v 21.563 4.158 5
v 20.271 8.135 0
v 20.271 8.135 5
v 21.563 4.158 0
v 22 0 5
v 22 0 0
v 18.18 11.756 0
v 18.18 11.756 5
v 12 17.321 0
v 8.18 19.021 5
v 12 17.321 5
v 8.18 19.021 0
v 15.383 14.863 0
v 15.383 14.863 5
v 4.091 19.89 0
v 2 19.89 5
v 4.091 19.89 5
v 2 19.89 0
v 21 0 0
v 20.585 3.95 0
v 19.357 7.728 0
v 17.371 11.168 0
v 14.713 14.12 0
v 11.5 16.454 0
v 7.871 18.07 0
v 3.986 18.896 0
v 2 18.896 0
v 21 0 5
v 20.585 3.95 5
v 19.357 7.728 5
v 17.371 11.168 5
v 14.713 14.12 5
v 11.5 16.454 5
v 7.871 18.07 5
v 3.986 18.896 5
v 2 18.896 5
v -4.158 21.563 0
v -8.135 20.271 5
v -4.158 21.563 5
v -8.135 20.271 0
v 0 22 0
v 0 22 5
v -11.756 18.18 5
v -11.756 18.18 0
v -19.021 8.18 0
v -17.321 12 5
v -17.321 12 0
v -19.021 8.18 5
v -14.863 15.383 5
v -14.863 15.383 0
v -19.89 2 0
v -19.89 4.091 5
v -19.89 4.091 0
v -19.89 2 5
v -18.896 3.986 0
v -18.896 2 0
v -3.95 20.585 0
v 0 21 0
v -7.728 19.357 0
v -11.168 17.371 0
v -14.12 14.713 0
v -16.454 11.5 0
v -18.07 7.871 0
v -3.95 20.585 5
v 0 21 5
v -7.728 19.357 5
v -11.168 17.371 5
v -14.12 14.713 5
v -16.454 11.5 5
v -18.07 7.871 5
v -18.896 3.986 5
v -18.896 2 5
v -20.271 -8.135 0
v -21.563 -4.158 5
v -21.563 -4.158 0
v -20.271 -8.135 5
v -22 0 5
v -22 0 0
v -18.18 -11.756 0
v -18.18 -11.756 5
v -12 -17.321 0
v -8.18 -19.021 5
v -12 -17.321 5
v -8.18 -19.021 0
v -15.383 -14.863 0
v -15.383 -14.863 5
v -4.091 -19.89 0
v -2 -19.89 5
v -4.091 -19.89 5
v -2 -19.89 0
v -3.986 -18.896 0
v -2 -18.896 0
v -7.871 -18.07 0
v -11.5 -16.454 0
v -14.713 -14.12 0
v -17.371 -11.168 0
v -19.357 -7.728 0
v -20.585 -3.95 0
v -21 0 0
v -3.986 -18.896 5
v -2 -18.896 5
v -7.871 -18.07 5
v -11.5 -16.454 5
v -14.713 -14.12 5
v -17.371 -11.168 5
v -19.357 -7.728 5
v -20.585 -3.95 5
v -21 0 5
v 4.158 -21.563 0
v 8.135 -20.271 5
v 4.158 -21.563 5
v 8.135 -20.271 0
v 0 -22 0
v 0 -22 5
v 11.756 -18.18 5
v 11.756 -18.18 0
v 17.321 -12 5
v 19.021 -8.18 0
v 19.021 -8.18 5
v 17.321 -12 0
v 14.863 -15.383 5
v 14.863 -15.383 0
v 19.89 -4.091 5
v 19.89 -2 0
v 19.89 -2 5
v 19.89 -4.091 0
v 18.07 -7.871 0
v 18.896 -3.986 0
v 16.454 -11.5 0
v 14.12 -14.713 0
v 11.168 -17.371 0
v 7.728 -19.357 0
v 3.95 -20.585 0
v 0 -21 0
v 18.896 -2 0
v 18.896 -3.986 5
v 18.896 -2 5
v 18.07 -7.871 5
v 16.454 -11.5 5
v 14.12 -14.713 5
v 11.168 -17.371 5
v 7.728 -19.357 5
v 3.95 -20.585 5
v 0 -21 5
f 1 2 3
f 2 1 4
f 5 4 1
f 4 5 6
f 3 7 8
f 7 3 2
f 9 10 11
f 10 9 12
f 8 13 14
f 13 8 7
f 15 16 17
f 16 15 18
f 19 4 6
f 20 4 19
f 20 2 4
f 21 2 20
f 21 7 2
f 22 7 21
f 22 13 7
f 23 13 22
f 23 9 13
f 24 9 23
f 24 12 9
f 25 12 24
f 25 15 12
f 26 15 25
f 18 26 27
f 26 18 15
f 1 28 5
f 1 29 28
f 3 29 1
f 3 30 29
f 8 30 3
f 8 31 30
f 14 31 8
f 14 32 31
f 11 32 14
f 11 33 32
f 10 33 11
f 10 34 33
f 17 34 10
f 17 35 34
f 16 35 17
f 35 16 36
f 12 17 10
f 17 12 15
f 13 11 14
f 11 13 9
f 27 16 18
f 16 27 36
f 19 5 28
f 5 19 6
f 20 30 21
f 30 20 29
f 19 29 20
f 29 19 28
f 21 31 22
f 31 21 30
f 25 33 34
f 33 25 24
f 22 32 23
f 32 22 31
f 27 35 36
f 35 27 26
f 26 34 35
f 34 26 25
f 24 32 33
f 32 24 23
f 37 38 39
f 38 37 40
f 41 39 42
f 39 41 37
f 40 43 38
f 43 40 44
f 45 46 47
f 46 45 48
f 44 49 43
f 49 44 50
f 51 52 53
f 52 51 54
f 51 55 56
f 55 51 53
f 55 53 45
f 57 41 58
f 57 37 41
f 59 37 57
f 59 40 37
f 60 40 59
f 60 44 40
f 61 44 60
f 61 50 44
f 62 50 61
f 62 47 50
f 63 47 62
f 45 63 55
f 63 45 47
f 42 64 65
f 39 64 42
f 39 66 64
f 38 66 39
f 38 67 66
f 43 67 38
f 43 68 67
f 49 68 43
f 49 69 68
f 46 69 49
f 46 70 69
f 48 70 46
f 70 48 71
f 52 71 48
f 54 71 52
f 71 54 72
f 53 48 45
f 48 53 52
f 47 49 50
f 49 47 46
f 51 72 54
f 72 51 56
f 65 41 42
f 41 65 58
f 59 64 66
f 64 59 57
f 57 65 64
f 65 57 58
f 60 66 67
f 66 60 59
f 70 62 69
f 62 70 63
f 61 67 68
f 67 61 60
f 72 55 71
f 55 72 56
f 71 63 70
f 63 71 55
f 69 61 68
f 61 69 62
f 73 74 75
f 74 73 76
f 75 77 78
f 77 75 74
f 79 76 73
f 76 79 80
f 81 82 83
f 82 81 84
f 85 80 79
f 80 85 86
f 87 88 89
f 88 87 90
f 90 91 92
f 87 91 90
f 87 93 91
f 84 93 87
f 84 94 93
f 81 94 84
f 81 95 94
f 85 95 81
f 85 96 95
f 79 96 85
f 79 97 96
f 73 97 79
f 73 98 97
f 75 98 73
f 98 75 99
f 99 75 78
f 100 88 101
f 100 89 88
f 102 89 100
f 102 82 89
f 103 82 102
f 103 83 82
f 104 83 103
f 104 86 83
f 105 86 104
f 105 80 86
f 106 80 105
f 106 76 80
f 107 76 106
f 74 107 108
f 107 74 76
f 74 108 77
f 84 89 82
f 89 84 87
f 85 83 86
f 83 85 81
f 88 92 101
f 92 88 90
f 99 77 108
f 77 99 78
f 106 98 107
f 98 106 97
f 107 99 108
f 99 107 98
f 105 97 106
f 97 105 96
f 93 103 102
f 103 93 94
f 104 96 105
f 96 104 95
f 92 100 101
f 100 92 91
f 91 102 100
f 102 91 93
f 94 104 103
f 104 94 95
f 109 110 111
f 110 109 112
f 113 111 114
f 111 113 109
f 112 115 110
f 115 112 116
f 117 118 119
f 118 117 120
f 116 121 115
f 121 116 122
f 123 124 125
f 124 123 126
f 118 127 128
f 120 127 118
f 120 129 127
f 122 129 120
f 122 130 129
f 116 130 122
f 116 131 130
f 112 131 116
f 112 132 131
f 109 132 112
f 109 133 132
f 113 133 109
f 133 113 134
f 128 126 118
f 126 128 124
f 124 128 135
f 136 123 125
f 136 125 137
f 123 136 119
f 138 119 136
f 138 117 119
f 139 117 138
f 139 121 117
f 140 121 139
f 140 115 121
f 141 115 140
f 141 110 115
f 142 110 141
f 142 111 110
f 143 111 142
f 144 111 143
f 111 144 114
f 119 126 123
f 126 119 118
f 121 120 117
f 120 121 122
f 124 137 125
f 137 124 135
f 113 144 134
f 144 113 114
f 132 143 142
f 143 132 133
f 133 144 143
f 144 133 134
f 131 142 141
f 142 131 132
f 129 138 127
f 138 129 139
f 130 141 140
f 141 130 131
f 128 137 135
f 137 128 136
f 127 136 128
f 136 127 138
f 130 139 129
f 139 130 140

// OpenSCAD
module segment (r)
{
    intersection ()
    {
        cylinder (r=r,h=5);
        cube ([r,r,6]);
    }
}

module arc(r)
{
    difference ()
    {
        segment (r);
        segment (r-1);
    }
}

module space (r)
{
    translate ([$t*10+2,0,0]) arc (r);
    translate ([0,$t*10+2,0]) rotate ([0,0,90]) arc (r);
    translate ([$t*10-2,0,0]) rotate ([0,0,180]) arc (r);
    translate ([0,$t*10-2,0]) rotate ([0,0,270]) arc (r);
}

space (20);
